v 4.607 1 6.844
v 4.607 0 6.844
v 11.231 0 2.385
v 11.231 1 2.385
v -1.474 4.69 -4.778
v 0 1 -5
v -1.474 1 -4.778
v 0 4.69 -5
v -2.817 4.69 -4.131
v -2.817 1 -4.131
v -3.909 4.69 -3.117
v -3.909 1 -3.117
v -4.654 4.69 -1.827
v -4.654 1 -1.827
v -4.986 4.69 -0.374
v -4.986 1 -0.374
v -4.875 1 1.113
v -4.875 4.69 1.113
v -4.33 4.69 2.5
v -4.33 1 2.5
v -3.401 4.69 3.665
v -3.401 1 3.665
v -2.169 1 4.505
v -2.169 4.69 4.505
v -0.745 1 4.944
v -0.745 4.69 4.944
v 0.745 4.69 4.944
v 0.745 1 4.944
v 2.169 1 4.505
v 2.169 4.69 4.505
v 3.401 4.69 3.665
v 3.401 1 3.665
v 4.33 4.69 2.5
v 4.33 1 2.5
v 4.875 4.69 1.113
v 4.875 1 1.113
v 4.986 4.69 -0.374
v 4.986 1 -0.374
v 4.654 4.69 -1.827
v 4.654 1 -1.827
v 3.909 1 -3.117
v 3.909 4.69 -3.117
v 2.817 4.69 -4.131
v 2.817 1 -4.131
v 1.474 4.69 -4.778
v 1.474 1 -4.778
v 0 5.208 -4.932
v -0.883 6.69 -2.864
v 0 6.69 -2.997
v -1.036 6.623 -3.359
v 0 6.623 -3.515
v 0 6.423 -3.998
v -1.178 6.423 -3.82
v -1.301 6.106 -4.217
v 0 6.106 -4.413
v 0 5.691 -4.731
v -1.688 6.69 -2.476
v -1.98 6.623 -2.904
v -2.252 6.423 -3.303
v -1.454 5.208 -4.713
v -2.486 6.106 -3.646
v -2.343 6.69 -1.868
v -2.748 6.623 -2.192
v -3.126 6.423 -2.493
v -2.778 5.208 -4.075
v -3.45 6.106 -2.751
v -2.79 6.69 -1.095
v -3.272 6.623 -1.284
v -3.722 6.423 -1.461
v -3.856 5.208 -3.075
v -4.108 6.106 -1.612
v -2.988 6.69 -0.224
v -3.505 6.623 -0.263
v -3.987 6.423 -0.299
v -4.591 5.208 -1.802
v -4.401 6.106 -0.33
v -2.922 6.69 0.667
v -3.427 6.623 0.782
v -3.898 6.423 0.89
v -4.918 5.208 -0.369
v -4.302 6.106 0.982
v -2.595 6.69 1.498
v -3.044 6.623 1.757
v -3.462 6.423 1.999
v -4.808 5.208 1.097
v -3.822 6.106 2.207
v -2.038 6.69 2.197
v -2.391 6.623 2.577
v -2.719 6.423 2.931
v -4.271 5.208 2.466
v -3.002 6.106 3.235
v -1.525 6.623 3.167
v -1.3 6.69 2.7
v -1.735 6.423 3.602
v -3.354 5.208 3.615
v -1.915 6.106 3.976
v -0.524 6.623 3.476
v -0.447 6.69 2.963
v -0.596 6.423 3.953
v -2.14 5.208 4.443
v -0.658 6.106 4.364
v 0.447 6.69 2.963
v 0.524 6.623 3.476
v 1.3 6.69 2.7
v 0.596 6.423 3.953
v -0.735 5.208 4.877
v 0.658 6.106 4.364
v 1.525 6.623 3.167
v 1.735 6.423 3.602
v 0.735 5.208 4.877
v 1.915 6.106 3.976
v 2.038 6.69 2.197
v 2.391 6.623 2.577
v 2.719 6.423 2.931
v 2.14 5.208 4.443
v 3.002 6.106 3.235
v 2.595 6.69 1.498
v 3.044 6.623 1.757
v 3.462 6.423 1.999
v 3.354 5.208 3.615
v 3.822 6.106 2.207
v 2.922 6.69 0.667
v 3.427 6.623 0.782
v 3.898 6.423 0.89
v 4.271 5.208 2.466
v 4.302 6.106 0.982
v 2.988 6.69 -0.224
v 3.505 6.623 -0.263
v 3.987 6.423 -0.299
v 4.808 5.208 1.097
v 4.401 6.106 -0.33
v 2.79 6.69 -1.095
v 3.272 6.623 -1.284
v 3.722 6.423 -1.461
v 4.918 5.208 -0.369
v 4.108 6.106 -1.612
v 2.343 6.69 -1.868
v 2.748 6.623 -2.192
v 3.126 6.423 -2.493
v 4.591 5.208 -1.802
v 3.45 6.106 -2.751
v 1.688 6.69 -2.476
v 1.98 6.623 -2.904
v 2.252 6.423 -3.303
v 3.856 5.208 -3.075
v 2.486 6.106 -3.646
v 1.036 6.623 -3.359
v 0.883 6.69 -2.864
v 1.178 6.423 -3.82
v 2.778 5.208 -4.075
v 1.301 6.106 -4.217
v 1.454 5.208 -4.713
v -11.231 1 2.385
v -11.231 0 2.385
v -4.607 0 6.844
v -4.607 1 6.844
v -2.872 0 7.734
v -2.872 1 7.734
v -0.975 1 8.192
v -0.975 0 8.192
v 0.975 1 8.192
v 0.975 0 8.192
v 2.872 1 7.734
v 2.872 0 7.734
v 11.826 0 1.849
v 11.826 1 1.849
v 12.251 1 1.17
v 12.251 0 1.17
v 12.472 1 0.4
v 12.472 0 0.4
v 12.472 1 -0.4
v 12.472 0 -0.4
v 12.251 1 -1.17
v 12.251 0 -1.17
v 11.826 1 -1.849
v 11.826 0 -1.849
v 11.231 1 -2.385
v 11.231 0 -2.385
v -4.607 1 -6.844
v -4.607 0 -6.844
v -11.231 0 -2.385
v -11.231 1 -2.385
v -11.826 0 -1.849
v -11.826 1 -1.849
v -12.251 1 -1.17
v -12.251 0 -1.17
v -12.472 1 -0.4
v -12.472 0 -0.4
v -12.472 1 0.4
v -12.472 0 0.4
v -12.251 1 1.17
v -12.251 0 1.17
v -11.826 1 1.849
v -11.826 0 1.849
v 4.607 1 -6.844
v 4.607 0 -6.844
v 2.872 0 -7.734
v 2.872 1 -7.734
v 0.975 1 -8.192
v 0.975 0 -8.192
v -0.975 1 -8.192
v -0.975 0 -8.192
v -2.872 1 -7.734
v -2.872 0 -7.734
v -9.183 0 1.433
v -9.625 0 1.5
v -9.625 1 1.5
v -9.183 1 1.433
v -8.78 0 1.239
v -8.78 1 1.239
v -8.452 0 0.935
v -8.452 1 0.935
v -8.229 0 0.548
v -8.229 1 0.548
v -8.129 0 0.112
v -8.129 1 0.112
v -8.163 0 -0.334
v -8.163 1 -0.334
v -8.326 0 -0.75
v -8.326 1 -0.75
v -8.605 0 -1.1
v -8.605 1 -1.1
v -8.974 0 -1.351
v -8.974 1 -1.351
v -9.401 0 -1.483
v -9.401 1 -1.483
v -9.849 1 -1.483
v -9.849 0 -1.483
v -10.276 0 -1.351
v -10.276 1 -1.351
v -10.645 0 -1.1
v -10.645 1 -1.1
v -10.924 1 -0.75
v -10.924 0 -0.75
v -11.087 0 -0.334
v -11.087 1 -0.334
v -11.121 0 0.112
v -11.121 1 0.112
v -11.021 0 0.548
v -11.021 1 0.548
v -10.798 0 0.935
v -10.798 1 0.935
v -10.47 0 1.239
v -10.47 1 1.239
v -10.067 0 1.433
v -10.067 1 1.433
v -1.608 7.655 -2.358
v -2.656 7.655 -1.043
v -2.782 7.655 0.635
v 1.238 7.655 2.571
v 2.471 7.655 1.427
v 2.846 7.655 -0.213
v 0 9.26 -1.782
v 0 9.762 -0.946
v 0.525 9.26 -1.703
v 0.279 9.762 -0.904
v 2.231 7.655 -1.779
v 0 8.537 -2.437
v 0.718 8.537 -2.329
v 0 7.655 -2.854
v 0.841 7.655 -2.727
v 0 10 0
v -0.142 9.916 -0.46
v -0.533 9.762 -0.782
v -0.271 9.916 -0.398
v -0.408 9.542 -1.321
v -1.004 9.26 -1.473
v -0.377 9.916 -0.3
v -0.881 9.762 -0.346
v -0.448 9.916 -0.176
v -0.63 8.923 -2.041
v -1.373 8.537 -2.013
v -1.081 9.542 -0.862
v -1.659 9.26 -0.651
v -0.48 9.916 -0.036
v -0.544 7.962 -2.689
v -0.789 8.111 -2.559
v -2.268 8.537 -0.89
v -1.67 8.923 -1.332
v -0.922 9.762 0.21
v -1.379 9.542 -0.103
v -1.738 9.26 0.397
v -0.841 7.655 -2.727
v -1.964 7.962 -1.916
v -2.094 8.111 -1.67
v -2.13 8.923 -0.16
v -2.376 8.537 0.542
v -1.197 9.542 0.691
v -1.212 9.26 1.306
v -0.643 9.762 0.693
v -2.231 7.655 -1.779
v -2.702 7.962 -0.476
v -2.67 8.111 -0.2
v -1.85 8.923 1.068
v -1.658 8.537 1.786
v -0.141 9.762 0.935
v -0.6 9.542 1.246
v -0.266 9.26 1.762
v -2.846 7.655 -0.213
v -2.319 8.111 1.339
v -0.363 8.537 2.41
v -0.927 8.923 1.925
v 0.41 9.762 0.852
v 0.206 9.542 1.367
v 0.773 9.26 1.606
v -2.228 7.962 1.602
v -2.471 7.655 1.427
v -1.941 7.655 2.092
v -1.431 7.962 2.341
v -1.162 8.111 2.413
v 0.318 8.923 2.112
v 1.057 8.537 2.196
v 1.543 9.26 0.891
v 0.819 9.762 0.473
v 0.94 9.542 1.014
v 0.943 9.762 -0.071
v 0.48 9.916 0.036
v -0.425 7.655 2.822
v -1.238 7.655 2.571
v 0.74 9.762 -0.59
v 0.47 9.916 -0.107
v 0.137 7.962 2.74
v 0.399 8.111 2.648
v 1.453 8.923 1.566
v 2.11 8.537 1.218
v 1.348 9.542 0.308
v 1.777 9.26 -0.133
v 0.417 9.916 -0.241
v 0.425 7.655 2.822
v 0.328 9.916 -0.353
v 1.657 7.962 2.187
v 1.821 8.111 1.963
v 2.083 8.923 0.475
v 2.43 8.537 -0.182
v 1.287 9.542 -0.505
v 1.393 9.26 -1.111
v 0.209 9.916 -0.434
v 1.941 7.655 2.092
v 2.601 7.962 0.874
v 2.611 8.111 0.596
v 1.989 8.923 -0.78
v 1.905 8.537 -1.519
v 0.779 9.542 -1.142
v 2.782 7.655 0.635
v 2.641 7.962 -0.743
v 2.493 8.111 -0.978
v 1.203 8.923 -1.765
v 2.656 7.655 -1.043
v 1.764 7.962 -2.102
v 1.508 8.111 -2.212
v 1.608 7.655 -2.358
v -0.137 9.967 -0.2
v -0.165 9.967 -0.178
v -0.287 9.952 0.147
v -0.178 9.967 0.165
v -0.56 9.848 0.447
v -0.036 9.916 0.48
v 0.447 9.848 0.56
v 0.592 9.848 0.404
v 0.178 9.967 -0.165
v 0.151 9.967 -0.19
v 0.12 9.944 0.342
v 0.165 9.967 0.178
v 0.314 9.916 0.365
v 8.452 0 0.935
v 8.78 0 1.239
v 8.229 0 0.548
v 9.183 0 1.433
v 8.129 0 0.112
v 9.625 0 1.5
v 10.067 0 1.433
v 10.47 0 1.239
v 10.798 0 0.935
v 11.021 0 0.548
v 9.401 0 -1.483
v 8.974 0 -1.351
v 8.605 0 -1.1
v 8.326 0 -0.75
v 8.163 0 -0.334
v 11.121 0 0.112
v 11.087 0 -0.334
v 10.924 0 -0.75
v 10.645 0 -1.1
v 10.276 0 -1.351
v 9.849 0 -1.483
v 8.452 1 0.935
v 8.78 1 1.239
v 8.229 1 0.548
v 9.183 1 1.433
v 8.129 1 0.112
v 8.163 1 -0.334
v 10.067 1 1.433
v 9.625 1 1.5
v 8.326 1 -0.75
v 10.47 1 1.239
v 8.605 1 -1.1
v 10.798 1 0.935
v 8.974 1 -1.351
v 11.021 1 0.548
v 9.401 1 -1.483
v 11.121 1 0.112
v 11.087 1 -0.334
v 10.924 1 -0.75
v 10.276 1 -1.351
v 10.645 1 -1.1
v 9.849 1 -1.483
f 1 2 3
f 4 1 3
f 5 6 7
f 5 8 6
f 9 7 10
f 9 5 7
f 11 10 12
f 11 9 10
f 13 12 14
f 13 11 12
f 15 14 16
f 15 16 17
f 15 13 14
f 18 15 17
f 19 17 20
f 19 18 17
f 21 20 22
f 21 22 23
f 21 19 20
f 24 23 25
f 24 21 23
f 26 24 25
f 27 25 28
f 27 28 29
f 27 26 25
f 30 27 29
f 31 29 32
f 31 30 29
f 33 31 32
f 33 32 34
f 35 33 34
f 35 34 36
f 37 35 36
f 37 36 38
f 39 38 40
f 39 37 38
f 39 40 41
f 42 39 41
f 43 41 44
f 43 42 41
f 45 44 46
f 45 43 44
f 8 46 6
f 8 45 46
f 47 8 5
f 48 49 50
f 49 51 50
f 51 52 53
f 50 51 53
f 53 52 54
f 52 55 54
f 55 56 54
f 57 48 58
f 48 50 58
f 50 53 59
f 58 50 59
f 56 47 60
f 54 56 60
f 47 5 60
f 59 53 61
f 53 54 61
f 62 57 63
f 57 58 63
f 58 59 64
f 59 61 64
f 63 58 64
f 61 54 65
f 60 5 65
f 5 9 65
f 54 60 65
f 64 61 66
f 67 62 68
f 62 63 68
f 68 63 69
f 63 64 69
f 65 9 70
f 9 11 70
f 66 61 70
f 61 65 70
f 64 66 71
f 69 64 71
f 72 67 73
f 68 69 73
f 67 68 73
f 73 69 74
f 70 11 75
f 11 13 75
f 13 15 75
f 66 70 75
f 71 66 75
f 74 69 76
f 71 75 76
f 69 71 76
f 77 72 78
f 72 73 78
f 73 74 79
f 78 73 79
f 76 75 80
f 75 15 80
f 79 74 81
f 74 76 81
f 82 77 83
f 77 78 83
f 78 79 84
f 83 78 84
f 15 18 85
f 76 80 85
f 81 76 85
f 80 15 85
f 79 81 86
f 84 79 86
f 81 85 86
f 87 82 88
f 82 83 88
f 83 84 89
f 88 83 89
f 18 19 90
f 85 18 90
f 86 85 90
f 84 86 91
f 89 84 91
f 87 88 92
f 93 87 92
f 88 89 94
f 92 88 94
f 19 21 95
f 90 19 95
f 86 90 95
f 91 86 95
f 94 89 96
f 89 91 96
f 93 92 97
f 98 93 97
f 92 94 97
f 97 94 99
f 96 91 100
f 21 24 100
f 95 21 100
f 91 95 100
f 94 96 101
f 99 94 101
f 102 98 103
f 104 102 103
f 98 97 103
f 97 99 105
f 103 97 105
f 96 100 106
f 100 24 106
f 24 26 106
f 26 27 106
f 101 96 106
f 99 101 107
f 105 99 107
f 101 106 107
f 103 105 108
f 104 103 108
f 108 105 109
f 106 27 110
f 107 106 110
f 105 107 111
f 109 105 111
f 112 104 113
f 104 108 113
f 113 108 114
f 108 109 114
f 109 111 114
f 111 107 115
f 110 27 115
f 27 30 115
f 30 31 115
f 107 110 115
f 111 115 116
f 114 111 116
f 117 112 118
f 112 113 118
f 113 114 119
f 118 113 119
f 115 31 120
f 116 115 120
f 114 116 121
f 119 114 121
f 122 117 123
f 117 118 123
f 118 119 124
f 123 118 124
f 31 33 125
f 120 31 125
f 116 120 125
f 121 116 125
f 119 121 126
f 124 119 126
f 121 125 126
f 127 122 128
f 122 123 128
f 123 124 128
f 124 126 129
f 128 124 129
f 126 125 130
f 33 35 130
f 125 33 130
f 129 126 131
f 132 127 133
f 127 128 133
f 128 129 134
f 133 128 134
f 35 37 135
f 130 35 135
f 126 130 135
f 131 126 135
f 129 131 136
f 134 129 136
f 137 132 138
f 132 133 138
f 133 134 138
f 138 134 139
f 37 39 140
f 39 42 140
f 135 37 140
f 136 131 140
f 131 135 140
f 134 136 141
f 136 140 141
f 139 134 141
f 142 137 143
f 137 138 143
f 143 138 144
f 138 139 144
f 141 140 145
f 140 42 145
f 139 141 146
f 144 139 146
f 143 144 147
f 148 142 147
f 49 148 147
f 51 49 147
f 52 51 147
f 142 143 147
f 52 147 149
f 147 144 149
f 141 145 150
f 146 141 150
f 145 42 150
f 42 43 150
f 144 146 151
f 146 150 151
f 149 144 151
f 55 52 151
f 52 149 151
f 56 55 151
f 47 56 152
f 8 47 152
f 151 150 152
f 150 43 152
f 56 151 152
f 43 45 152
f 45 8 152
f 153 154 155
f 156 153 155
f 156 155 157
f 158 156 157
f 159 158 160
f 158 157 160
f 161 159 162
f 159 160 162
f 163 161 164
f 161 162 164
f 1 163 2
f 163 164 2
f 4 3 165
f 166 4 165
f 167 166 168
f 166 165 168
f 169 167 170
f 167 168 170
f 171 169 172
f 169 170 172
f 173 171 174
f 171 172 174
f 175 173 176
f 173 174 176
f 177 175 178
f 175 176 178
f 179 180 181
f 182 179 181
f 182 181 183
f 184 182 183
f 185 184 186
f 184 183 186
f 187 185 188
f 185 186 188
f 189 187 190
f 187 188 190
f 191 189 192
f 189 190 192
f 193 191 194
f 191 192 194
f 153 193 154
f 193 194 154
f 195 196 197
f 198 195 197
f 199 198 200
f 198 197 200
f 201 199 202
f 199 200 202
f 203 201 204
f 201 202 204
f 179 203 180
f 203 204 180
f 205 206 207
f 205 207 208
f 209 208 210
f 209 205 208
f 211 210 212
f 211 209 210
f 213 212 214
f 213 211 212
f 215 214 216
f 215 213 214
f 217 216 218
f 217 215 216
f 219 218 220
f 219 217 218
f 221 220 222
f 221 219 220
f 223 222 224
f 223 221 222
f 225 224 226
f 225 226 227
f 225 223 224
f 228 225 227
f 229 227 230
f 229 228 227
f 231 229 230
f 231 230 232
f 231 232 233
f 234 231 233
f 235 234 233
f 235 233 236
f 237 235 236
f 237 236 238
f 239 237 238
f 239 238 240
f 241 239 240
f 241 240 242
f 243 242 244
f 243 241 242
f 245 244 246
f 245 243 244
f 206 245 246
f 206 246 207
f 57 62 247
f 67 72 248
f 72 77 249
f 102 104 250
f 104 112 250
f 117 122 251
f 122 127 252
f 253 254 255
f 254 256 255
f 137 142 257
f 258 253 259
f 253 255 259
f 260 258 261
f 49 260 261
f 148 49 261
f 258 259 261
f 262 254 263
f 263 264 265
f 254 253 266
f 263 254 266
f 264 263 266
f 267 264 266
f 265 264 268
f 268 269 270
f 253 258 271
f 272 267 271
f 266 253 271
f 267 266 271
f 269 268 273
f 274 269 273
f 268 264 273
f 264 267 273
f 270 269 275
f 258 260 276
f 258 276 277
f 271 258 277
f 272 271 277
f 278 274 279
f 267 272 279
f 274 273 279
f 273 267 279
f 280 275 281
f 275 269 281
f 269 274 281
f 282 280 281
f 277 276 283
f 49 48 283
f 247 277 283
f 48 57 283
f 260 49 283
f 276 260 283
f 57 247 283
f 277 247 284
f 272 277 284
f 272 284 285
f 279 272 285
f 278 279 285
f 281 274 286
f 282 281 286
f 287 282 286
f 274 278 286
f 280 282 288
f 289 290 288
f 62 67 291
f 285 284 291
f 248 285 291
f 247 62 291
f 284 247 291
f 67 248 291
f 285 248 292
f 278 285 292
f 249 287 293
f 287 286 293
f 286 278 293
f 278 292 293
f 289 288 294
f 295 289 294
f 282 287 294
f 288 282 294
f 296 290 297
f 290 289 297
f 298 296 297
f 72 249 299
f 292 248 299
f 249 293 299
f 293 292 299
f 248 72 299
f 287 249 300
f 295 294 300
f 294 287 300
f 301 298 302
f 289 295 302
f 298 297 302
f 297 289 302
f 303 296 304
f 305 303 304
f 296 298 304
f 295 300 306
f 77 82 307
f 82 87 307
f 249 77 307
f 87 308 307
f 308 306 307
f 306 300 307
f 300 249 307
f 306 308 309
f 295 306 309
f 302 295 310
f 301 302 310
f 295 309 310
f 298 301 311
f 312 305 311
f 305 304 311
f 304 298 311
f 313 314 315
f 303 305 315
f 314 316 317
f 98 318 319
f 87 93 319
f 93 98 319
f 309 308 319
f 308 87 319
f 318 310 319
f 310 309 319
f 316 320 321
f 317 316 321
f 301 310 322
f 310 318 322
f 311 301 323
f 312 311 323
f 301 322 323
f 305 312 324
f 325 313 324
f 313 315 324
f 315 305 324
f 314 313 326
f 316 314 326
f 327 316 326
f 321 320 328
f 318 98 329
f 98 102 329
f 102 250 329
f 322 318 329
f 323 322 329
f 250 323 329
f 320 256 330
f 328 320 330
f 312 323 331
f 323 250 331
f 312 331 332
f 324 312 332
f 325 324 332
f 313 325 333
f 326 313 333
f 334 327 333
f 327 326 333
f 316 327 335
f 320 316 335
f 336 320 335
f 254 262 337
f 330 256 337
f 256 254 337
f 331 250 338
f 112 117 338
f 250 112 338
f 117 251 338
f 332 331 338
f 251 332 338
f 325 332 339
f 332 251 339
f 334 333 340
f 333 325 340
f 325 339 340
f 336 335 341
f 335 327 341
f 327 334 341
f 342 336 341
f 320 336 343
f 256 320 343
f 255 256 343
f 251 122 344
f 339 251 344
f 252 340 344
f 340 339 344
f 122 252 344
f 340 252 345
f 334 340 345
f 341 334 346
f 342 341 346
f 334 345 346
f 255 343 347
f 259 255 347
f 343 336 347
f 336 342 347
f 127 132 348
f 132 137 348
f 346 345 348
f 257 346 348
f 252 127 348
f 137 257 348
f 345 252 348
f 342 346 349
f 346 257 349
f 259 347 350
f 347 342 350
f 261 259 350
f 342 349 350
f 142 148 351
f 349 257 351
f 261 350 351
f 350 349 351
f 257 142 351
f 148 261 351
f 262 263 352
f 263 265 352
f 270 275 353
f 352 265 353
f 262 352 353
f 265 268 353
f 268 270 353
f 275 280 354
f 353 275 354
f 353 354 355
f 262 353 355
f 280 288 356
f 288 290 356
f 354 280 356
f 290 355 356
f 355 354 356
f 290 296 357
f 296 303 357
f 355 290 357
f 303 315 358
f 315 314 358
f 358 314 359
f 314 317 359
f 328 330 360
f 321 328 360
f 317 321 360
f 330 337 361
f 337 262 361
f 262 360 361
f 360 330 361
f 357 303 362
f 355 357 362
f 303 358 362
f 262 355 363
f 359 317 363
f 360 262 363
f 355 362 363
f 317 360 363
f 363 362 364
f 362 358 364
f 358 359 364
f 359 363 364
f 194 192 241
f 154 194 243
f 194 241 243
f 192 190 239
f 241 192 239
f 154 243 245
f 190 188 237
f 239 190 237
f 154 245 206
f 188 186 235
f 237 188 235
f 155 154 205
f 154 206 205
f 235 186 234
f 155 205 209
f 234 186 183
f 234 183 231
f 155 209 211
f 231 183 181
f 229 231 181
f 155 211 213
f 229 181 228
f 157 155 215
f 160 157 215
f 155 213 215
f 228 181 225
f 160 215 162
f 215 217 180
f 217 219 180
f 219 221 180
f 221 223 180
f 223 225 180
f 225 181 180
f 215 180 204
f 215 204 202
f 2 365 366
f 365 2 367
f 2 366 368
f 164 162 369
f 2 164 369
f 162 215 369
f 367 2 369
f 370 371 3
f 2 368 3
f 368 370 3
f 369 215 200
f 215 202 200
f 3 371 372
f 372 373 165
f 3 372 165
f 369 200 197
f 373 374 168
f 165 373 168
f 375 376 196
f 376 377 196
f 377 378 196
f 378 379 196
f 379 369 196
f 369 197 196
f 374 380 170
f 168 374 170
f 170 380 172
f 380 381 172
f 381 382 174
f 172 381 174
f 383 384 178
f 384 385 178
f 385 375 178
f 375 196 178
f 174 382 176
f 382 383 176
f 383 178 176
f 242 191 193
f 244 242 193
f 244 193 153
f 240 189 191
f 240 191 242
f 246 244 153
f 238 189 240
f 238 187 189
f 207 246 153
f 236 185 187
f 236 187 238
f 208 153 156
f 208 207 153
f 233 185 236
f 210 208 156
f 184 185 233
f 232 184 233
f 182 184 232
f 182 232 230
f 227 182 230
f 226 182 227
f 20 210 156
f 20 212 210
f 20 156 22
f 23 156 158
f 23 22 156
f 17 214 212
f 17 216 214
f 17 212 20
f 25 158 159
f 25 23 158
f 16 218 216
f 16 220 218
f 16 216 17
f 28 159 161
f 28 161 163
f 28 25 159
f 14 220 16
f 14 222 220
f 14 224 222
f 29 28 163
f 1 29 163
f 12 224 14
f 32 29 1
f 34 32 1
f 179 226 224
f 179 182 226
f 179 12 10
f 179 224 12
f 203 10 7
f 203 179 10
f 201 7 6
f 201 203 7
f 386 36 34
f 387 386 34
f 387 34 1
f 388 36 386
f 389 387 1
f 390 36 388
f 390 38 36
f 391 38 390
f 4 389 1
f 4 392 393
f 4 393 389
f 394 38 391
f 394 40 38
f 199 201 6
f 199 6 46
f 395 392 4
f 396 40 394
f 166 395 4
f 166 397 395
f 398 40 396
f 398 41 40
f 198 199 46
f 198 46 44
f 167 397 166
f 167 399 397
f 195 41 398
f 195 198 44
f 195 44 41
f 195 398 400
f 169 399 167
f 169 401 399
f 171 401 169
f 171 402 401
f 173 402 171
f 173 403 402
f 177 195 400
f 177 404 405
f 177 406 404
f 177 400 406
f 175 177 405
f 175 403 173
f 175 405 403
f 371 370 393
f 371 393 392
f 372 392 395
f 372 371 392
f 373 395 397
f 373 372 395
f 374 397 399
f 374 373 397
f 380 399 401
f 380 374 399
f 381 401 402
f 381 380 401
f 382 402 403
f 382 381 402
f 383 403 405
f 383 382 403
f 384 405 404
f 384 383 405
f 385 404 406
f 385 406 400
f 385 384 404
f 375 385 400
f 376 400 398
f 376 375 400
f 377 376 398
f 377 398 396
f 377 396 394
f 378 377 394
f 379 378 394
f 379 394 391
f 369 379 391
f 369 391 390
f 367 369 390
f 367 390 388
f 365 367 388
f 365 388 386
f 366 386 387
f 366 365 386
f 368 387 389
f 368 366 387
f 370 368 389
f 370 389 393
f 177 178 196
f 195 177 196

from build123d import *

# Parameters (mm, degrees)
SKETCH2_R          = 1.5
BOSS_EXTRU_1_DEPTH = 1
ESQUISSE1_W        = 5
ESQUISSE1_H        = 3.690231621


with BuildPart() as part:
    # Sketch2 → Boss.-Extru.1 (new body)
    with BuildSketch(Plane(origin=(0, 0, 0), x_dir=(1, 0, 0), z_dir=(0, 1, 0))):
        with BuildLine():
            Line((-4.607142857, 6.843736895), (-11.230519481, 2.384938615))
            ThreePointArc((-11.230519481, 2.384938615), (-12.5, 0), (-11.230519481, -2.384938615))
            Line((-11.230519481, -2.384938615), (-4.607142857, -6.843736895))
            ThreePointArc((-4.607142857, -6.843736895), (0, -8.25), (4.607142857, -6.843736895))
            Line((4.607142857, -6.843736895), (11.230519481, -2.384938615))
            ThreePointArc((11.230519481, -2.384938615), (12.5, 0), (11.230519481, 2.384938615))
            Line((11.230519481, 2.384938615), (4.607142857, 6.843736895))
            ThreePointArc((4.607142857, 6.843736895), (0, 8.25), (-4.607142857, 6.843736895))
        make_face()
        with Locations(Location((-9.625, 0, 0), (0, 0, 270))):
            Circle(SKETCH2_R, mode=Mode.SUBTRACT)
        with Locations(Location((9.625, 0, 0), (0, 0, 270))):
            Circle(SKETCH2_R, mode=Mode.SUBTRACT)
    extrude(amount=BOSS_EXTRU_1_DEPTH)

    # Esquisse1 → Révolution1 (revolve)
    with BuildSketch(Plane.XY, mode=Mode.PRIVATE) as r_volution1_sk:
        with BuildLine():
            ThreePointArc((0, 10), (-2.136216237, 8.92264844), (-2.996693627, 6.690231621))
            Line((-2.996693627, 6.690231621), (0, 6.690231621))
            Line((0, 6.690231621), (0, 10))
        make_face()
        with BuildLine():
            ThreePointArc((-2.996693627, 6.690231621), (-4.413044266, 6.105614645), (-5, 4.690231621))
            Line((-5, 4.690231621), (0, 4.690231621))
            Line((0, 4.690231621), (0, 6.690231621))
            Line((0, 6.690231621), (-2.996693627, 6.690231621))
        make_face()
        with Locations((-2.5, 2.845115811)):
            Rectangle(ESQUISSE1_W, ESQUISSE1_H)
    revolve(r_volution1_sk.sketch.rotate(Axis((0, -1.148221133, 0), (0, 1, 0)), 270), axis=Axis((0, -1.148221133, 0), (0, 1, 0)))


solid = part.part
